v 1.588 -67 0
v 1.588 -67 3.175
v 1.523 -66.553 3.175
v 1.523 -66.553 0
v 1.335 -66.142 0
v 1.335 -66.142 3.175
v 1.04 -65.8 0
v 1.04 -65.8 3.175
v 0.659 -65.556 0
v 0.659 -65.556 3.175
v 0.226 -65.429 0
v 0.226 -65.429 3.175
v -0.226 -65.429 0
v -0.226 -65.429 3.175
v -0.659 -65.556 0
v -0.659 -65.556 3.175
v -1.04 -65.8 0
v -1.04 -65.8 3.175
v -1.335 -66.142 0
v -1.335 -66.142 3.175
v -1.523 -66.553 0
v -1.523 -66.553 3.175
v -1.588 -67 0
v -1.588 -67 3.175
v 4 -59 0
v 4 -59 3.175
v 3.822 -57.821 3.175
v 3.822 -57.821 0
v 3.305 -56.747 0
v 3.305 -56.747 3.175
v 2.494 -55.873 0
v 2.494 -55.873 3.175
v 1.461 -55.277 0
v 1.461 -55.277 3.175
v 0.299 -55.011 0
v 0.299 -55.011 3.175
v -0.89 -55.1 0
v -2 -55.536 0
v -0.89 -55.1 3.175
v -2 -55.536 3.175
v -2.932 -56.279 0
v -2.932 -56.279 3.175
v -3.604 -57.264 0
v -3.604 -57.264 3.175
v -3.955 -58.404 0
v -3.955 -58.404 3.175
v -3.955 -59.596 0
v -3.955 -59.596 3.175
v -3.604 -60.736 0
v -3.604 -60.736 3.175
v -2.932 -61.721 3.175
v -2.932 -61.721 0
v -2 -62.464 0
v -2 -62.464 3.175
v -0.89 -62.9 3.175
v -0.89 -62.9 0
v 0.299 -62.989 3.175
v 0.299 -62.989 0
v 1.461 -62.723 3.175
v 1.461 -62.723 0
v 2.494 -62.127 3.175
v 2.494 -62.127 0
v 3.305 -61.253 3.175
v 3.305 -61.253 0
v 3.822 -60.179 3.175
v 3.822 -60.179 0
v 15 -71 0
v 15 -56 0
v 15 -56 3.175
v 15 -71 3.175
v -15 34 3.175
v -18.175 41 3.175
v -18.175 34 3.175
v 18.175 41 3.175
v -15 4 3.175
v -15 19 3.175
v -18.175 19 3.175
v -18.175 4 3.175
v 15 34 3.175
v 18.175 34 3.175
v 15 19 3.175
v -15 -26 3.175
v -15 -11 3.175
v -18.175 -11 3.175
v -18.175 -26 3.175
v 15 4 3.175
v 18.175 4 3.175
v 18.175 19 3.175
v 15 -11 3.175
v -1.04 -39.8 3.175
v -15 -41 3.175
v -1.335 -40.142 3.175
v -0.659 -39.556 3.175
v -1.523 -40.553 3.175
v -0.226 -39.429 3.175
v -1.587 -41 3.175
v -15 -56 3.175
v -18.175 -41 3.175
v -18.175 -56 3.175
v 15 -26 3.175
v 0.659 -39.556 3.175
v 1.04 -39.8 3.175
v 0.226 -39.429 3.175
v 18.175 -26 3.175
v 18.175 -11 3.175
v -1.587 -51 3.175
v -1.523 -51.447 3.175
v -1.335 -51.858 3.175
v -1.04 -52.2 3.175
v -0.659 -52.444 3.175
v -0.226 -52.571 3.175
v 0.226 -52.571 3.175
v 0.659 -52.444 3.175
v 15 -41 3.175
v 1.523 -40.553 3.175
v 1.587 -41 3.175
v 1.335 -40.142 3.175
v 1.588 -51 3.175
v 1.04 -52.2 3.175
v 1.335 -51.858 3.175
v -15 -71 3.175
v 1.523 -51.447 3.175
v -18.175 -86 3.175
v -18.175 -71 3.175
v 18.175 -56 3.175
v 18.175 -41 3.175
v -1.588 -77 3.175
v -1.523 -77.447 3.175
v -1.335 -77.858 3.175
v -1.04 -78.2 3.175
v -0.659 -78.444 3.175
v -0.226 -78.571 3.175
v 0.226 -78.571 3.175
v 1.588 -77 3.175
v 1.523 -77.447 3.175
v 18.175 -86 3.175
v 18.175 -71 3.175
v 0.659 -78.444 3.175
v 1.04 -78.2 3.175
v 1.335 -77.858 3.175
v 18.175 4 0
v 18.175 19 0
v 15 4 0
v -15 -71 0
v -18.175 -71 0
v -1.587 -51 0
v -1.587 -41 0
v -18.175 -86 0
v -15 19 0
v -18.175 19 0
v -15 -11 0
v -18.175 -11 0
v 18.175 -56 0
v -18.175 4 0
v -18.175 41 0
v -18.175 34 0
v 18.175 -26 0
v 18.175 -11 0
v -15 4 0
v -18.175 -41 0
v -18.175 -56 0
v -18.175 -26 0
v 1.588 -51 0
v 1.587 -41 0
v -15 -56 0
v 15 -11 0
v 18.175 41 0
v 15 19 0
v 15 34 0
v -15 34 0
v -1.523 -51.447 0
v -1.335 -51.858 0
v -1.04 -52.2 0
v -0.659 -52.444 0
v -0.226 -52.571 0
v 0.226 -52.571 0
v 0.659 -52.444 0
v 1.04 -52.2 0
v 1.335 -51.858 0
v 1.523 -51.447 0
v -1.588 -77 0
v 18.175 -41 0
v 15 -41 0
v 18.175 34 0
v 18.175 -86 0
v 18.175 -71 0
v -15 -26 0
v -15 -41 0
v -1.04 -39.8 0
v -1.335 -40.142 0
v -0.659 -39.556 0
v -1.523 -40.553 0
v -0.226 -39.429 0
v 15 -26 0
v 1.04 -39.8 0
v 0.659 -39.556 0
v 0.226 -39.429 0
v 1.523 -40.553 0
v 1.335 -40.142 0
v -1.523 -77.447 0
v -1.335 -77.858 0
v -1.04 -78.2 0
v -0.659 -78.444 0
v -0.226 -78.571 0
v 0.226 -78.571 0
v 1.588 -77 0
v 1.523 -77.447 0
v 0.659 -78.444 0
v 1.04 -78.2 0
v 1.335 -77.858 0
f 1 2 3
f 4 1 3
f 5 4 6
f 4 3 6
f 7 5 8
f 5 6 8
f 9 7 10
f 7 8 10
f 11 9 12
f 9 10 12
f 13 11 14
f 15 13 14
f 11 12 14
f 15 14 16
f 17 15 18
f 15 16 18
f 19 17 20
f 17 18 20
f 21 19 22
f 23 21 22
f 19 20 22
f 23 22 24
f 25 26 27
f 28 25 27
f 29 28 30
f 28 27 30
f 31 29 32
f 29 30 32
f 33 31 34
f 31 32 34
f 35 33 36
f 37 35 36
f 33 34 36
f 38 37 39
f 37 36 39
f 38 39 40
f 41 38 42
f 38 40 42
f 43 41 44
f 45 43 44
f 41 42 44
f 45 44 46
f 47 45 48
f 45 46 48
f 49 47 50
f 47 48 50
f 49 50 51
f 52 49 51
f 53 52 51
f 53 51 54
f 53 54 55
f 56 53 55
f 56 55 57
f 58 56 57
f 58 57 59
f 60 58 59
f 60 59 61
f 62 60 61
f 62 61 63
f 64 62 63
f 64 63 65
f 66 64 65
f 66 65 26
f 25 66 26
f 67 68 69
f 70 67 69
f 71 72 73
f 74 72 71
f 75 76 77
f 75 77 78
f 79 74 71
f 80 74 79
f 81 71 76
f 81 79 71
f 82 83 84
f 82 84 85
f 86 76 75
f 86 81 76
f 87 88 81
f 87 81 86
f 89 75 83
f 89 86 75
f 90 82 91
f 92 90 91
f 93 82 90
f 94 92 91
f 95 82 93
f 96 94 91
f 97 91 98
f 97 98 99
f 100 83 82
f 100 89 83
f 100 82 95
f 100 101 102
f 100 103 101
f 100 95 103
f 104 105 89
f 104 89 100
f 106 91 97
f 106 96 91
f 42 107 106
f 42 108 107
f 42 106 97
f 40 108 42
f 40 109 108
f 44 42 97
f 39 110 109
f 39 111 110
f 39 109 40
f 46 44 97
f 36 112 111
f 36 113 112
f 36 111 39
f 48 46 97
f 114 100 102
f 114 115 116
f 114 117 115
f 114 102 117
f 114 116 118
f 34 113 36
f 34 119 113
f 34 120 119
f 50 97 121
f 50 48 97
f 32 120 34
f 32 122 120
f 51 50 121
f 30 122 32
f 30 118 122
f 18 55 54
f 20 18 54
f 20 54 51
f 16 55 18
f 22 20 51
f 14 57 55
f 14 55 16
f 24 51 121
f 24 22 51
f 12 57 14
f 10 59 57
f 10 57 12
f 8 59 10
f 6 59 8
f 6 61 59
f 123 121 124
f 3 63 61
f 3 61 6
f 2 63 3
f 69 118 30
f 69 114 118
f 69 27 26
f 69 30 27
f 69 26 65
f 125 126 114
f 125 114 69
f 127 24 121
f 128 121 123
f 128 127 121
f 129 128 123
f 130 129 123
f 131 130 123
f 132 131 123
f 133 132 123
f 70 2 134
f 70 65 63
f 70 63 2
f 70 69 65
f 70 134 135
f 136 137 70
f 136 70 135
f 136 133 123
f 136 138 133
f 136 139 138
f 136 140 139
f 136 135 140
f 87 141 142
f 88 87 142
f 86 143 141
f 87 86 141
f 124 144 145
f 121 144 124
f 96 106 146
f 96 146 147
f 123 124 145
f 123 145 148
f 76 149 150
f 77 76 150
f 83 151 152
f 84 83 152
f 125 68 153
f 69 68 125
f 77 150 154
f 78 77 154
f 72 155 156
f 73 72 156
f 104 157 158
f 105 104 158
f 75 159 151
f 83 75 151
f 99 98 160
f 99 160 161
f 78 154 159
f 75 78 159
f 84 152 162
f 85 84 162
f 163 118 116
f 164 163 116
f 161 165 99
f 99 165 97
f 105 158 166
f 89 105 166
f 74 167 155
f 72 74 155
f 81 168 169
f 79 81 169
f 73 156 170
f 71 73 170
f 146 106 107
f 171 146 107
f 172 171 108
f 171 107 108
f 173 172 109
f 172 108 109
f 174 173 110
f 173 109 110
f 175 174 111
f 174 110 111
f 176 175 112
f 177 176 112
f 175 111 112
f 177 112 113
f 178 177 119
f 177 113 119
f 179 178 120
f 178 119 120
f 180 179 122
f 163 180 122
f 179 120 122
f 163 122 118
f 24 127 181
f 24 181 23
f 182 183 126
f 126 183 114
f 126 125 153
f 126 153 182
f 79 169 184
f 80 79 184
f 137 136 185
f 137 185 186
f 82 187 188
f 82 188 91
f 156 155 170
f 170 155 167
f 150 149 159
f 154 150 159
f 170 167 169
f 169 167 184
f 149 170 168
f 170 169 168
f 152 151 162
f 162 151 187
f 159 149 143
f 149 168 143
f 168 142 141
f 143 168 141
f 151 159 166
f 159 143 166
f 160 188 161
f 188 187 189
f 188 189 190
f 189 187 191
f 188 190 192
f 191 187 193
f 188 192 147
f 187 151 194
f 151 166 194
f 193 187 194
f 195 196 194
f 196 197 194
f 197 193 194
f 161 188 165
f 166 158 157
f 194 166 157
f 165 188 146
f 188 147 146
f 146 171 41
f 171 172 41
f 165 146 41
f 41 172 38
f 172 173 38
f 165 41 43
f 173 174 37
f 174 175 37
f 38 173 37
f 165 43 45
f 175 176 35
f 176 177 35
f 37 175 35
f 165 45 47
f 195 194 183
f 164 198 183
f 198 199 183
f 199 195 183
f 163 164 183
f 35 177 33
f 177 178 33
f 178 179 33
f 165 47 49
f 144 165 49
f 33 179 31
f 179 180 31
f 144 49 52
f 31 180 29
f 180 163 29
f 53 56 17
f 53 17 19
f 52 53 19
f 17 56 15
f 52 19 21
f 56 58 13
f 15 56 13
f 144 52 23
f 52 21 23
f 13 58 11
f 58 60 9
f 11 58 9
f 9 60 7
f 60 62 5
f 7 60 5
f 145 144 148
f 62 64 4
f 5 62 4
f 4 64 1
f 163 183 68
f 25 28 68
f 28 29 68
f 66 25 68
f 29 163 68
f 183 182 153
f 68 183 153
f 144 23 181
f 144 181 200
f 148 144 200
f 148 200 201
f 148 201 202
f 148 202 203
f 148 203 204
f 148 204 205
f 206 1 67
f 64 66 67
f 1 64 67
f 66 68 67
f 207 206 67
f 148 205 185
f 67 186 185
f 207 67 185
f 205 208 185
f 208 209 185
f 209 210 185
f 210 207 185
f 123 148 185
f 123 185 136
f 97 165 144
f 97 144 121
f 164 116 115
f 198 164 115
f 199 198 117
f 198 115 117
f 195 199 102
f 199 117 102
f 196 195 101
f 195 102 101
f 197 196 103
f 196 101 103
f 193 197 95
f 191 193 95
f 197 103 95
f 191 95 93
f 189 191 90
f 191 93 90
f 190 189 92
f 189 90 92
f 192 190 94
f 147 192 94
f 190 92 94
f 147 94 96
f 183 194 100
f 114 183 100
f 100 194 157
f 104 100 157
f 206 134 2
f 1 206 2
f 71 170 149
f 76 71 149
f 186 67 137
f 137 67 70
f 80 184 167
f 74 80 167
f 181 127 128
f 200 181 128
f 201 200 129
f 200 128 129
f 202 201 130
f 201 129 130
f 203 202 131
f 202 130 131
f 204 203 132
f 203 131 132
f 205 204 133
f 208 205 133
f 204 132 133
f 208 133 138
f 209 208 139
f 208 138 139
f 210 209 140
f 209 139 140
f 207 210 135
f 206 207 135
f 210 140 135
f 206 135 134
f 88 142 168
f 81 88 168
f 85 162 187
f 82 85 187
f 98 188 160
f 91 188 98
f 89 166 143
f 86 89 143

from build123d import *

# Parameters (mm, degrees)
F1_DEPTH  = 3.175
F1_FACE_W = 30
F1_FACE_H = 3.175
F2_DEPTH  = 45
F3_R      = 4
F3_W      = 3.175
F3_H      = 10
F4_DEPTH  = 25
F5_W      = 15
F5_H      = 3.175
F6_DEPTH  = 3.175
F7_W      = 15
F7_H      = 3.175
F8_DEPTH  = 3.175


with BuildPart() as f1:
    # F0 (on Top) → F1 (new body)
    with BuildSketch(Plane.XY):
        Polygon((-15, -41), (15, -41), (15, -26), (18.175, -26), (18.175, -11), (15, -11), (15, 4), (18.175, 4), (18.175, 19), (15, 19), (15, 34), (18.175, 34), (18.175, 41), (-18.175, 41), (-18.175, 34), (-15, 34), (-15, 19), (-18.175, 19), (-18.175, 4), (-15, 4), (-15, -11), (-18.175, -11), (-18.175, -26), (-15, -26), align=None)
    extrude(amount=F1_DEPTH)

    # F1_face (on face) → F2 (join)
    with BuildSketch(Plane(origin=(0, -41, 1.5875), x_dir=(1, 0, 0), z_dir=(0, -1, 0))):
        Rectangle(F1_FACE_W, F1_FACE_H)
    extrude(amount=F2_DEPTH)

    # F3 (on face) → F4 (cut)
    with BuildSketch(Plane.XY.offset(3.175)):
        with Locations((0, -59)):
            Circle(F3_R)
        with BuildLine():
            ThreePointArc((-1.5875, -51), (0, -52.5875), (1.5875, -51))
            Line((1.5875, -51), (-1.5875, -51))
        make_face()
        with Locations((0, -46)):
            Rectangle(F3_W, F3_H)
        with BuildLine():
            Line((-1.5875, -41), (1.5875, -41))
            ThreePointArc((1.5875, -41), (0, -39.4125), (-1.5875, -41))
        make_face()
        with BuildLine():
            ThreePointArc((-1.5875, -77), (0, -78.5875), (1.5875, -77))
            Line((1.5875, -77), (-1.5875, -77))
        make_face()
        with Locations((0, -72)):
            Rectangle(F3_W, F3_H)
        with BuildLine():
            Line((-1.5875, -67), (1.5875, -67))
            ThreePointArc((1.5875, -67), (0, -65.4125), (-1.5875, -67))
        make_face()
    extrude(amount=-F4_DEPTH, mode=Mode.SUBTRACT)

    # F5 (on face) → F6 (join)
    with BuildSketch(Plane.YZ.offset(15)):
        with Locations((-78.5, 1.5875)):
            Rectangle(F5_W, F5_H)
        with Locations((-48.5, 1.5875)):
            Rectangle(F5_W, F5_H)
    extrude(amount=F6_DEPTH)

    # F7 (on face) → F8 (join)
    with BuildSketch(Plane(origin=(-15, 0, 0), x_dir=(0, -1, 0), z_dir=(-1, 0, 0))):
        with Locations((48.5, 1.5875)):
            Rectangle(F7_W, F7_H)
        with Locations((78.5, 1.5875)):
            Rectangle(F7_W, F7_H)
    extrude(amount=F8_DEPTH)


solid = f1.part
